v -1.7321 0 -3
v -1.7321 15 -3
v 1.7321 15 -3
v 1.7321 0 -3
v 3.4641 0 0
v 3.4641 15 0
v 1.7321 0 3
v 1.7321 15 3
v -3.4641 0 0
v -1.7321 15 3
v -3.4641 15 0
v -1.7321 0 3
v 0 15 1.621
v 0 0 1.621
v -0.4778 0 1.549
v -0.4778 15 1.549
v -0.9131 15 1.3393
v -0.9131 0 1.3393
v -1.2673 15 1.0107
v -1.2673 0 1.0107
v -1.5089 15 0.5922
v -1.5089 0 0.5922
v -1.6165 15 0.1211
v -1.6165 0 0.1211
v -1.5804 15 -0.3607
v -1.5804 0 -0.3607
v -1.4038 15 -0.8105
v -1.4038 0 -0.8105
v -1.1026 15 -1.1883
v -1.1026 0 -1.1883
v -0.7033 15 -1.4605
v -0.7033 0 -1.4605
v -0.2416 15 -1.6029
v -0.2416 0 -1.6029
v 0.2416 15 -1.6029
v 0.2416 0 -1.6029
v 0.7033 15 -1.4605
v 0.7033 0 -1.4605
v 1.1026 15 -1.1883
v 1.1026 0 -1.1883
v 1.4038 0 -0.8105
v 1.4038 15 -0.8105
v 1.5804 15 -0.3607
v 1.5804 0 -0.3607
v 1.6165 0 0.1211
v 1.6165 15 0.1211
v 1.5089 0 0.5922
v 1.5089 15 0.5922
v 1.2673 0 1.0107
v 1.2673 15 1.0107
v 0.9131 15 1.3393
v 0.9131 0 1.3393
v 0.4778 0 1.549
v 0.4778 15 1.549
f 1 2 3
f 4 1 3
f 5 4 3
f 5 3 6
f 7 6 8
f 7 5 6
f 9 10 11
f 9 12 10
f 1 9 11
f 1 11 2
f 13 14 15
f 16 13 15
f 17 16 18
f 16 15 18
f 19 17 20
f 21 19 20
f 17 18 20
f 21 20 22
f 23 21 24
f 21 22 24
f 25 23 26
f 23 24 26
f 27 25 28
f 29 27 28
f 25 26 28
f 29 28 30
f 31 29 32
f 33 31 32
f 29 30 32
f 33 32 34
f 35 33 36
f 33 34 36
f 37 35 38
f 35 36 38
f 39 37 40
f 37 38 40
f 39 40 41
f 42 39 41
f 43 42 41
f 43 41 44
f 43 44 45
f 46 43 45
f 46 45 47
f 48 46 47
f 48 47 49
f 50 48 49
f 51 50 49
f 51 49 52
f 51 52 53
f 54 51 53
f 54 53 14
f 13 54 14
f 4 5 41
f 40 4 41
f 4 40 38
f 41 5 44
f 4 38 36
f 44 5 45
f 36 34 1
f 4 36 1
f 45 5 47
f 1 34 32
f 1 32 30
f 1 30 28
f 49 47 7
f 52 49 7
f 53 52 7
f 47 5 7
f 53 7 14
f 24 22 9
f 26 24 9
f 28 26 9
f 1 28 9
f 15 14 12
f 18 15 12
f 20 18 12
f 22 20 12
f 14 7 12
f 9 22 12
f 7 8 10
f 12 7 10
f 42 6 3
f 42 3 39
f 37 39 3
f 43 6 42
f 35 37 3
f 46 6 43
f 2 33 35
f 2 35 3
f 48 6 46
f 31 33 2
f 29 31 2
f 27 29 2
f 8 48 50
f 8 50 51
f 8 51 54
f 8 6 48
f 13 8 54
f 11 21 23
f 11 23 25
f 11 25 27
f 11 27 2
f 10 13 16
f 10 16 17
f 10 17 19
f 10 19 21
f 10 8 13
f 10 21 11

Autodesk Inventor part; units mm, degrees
ref_plane "YZ Plane" through (0, 0, 0) normal (1, 0, 0) x (0, 1, 0)
ref_plane "XZ Plane" through (0, 0, 0) normal (0, 1, 0) x (-1, 0, 0)
ref_plane "XY Plane" through (0, 0, 0) normal (0, 0, 1) x (1, 0, 0)
sketch "Sketch1" plane through (0, 0, 0) normal (0, 1, 0) x (-1, 0, 0)
  line L0 (-1.7321, -3) -> (-3.4641, 0)
  line L1 (-3.4641, 0) -> (-1.7321, 3)
  line L2 (-1.7321, 3) -> (1.7321, 3)
  line L3 (1.7321, 3) -> (3.4641, 0)
  line L4 (3.4641, 0) -> (1.7321, -3)
  line L5 (1.7321, -3) -> (-1.7321, -3)
  point P0 (0, 0)
  point P1 (0, 0)
  dimension "d0" = 3
extrude "Extrusion1" add sketch "Sketch1" along normal blind 15
sketch "Sketch2" plane through (0, 15, 0) normal (0, 1, 0) x (1, 0, 0)
  point P0 (0, 0)
hole "Hole1" at (0, 15, 0) direction (0, -1, 0) diameter 3.242 end through all thread size "M4x0.7" class "6H" standard "ISO Metric profile"
properties part number "StandoffM4x15A" material "Brass, Soft Yellow"
